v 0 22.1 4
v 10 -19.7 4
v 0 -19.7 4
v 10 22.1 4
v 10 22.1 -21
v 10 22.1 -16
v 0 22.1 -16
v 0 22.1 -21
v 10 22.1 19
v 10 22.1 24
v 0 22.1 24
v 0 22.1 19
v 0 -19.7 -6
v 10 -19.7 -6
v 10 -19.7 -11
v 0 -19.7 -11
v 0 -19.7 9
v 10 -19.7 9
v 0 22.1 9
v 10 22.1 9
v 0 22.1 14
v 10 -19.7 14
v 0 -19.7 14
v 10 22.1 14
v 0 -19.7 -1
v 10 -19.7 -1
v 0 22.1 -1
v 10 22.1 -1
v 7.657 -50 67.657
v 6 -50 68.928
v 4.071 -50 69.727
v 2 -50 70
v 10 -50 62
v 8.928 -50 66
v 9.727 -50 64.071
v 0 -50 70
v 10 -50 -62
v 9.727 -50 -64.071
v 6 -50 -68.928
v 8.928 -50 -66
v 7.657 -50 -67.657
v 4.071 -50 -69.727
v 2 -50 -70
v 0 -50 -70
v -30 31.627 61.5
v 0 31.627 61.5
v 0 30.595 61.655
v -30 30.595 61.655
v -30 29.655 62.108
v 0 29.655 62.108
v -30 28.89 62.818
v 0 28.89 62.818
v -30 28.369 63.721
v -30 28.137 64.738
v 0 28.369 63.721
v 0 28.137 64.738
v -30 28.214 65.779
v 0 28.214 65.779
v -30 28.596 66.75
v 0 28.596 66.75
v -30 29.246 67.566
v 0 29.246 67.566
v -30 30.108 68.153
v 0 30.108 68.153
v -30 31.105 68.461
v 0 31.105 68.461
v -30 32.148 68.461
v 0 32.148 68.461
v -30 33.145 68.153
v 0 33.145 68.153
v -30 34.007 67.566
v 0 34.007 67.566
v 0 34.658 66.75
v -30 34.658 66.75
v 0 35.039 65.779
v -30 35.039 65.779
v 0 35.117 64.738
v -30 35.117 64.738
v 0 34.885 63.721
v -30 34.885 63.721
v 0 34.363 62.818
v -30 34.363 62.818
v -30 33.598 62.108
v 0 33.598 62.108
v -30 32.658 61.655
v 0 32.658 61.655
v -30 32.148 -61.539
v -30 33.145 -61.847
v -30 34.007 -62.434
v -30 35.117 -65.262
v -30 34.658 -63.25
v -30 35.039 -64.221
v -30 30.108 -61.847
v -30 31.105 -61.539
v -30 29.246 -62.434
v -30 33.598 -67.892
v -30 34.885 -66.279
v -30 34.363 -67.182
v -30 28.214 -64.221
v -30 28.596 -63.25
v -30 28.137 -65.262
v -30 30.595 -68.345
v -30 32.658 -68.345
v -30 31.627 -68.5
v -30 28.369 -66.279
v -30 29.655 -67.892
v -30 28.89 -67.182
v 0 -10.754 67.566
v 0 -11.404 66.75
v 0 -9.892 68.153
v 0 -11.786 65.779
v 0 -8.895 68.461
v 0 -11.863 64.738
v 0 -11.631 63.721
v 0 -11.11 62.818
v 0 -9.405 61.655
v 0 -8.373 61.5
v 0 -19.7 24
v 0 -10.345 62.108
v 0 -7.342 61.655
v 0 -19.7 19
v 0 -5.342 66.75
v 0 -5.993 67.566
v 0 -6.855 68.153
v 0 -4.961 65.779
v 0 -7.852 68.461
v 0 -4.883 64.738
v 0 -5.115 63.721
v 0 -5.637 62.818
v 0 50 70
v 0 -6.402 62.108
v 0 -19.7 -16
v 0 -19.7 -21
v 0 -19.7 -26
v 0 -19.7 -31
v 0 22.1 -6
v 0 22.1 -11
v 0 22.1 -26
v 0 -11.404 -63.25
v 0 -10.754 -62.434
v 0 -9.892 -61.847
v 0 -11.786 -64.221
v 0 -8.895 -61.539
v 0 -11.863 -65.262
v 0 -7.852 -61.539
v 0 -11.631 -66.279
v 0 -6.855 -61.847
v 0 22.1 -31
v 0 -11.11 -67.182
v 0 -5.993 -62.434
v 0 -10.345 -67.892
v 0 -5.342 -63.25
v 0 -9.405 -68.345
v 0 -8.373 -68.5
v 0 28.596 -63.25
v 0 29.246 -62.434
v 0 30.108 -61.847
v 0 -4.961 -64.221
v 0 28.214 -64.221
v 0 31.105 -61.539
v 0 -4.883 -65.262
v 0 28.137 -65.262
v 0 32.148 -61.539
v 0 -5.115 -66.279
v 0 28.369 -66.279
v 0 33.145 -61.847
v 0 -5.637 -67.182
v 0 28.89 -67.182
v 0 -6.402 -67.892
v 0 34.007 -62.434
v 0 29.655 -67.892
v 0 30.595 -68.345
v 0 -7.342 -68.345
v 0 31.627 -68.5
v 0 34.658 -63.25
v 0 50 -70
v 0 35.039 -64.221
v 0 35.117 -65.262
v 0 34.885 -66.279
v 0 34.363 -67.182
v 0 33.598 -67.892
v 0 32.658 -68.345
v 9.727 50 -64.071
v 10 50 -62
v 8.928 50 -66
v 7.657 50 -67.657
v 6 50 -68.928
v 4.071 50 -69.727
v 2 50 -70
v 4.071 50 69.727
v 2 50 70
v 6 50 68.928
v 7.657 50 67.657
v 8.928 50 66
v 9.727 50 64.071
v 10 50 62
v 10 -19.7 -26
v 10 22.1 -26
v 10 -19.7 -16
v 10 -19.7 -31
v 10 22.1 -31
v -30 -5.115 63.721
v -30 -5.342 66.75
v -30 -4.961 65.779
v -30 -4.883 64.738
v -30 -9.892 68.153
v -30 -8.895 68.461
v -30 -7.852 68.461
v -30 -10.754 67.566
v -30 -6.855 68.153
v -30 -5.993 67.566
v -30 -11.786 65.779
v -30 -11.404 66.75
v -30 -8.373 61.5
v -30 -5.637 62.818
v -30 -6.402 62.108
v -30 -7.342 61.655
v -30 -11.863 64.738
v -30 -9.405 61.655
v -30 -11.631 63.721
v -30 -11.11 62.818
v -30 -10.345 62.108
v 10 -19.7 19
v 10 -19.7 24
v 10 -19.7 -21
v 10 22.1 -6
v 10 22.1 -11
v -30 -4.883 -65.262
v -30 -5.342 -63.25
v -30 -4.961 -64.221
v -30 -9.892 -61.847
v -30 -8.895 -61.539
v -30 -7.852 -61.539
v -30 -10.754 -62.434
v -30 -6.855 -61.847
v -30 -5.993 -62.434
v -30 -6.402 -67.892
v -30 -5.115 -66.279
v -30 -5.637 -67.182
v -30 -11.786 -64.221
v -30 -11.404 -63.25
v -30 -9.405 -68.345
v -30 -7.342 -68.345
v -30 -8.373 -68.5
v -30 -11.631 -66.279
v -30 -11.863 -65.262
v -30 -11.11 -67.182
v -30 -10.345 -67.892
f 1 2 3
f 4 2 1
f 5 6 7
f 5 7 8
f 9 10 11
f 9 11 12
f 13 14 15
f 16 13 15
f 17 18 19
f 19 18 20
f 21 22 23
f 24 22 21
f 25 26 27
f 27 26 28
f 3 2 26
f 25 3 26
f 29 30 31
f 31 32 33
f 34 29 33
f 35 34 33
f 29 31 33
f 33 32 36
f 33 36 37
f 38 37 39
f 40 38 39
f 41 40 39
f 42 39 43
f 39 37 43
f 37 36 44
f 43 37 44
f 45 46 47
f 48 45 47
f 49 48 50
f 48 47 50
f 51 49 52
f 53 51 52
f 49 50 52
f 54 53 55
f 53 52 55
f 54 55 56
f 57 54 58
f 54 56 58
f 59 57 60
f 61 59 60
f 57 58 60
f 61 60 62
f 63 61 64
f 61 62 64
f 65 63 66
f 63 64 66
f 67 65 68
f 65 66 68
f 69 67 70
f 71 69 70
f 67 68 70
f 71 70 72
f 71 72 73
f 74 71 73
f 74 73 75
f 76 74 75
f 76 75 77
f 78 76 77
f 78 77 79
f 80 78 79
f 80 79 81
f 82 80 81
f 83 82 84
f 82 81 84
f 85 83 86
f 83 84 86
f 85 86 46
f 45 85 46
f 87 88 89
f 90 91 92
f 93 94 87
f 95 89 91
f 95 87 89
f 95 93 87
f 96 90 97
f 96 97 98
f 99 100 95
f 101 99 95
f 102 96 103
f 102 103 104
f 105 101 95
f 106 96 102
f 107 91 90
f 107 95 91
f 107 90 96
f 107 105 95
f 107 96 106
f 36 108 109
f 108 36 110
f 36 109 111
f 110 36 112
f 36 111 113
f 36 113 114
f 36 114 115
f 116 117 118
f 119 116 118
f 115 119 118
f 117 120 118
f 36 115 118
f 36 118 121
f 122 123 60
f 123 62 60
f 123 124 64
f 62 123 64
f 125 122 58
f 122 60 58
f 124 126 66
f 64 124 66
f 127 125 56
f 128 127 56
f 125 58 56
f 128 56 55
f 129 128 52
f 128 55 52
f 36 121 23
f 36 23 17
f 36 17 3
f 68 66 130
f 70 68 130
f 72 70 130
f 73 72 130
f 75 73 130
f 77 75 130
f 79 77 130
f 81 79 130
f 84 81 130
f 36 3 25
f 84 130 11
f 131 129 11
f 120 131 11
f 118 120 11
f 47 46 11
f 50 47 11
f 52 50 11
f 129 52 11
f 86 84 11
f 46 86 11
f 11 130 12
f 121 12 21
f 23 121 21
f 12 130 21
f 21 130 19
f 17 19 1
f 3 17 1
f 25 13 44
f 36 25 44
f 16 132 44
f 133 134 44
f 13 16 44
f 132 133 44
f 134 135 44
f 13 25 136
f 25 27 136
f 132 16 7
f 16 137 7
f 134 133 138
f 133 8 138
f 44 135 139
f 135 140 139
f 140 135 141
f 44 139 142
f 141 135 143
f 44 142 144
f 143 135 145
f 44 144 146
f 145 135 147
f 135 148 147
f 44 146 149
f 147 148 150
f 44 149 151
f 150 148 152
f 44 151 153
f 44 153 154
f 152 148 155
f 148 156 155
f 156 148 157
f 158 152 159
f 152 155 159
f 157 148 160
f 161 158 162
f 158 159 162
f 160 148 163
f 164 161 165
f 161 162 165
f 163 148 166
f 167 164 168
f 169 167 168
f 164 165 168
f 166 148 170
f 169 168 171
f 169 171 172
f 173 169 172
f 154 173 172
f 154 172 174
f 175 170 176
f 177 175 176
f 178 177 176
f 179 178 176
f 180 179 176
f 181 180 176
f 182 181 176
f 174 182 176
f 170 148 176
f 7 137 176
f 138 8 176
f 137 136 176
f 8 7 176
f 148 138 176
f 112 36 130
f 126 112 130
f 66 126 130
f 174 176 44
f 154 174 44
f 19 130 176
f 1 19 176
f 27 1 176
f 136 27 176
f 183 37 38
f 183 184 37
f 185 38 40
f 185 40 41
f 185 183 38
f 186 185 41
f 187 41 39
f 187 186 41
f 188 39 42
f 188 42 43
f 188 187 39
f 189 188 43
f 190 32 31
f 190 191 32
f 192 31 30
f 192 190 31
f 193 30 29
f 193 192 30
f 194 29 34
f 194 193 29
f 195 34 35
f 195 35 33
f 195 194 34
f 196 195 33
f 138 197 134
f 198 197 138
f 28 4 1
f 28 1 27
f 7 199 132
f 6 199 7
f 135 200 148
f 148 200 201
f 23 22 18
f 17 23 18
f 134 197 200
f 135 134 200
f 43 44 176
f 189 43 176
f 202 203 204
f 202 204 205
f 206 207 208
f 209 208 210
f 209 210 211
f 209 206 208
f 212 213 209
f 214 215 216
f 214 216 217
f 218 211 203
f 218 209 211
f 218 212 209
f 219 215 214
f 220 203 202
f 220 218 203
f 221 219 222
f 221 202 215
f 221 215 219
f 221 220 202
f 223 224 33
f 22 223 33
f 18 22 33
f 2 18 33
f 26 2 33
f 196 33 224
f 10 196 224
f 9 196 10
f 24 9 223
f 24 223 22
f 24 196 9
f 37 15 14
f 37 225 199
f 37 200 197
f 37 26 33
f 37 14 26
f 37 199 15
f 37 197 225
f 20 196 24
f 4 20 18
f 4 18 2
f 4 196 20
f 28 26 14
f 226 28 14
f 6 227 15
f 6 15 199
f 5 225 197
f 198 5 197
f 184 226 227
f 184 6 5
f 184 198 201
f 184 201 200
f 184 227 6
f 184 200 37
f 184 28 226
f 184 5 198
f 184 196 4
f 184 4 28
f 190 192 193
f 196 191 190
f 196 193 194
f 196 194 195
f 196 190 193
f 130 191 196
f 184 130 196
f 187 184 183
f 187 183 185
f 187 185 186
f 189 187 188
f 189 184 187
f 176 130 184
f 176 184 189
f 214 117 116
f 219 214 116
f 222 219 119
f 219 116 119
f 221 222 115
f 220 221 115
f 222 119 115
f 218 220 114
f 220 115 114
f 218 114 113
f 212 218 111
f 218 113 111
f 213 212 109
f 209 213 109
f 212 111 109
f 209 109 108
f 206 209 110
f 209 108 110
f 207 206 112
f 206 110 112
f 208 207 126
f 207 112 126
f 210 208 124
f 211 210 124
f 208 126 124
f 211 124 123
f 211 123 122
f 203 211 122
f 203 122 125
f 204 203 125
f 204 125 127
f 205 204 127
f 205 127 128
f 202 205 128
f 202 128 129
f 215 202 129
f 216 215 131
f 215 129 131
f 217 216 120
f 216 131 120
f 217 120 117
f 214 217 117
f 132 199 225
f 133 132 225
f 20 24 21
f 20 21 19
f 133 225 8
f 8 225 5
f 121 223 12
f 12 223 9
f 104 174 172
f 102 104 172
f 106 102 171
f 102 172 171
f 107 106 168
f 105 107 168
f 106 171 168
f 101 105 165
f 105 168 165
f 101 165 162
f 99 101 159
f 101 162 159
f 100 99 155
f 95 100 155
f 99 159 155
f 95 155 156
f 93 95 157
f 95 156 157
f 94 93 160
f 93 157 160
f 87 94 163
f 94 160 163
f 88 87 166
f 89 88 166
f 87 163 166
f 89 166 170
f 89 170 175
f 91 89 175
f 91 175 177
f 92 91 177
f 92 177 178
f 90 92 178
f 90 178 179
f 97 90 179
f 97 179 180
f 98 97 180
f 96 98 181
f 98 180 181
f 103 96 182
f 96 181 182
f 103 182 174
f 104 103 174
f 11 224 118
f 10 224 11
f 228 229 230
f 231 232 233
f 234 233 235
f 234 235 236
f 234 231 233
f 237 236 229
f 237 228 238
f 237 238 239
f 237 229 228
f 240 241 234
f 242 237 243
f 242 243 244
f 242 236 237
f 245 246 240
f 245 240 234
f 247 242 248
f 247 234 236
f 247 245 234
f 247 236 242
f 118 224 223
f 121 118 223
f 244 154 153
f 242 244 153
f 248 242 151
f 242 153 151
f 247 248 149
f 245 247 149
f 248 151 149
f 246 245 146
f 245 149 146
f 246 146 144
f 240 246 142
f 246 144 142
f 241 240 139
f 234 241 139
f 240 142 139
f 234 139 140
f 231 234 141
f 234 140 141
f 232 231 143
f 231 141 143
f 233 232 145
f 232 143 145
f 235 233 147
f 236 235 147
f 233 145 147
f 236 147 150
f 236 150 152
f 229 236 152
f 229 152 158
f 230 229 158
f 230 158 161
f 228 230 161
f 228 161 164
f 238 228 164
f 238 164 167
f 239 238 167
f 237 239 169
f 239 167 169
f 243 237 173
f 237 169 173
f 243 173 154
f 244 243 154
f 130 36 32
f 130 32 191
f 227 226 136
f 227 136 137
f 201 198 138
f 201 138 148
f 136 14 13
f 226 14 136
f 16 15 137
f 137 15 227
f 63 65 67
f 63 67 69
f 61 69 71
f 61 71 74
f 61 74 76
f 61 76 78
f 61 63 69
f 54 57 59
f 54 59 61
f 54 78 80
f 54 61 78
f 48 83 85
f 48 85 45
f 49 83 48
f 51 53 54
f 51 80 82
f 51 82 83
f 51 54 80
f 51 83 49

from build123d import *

# Parameters (mm, degrees)
SKETCH2_W           = 140
SKETCH2_H           = 100
BOSS_EXTRUDE1_DEPTH = 10
SKETCH3_R           = 3.5
BOSS_EXTRUDE2_DEPTH = 30
FILLET1_R           = 8
SKETCH4_W           = 5
SKETCH4_H           = 41.8
CUT_EXTRUDE1_DEPTH  = 30


with BuildPart() as part:
    # Sketch2 → Boss-Extrude1 (new body)
    with BuildSketch(Plane(origin=(0, 0, 0), x_dir=(0, 0, -1), z_dir=(1, 0, 0))):
        Rectangle(SKETCH2_W, SKETCH2_H)
    extrude(amount=BOSS_EXTRUDE1_DEPTH)

    # Sketch3 → Boss-Extrude2 (add)
    with BuildSketch(Plane.ZY):
        with Locations(Location((-65, 31.6267322, 0), (0, 0, 180))):
            Circle(SKETCH3_R)
        with Locations(Location((-65, -8.3732678, 0), (0, 0, 180))):
            Circle(SKETCH3_R)
        with Locations(Location((65, 31.6267322, 0), (0, 0, 180))):
            Circle(SKETCH3_R)
        with Locations(Location((65, -8.3732678, 0), (0, 0, 180))):
            Circle(SKETCH3_R)
    extrude(amount=BOSS_EXTRUDE2_DEPTH)

    # Fillet1
    fillet1_edges = [part.edges().sort_by_distance(p)[0] for p in [
        (10, 0, -70),
        (10, 0, 70),
    ]]
    fillet(fillet1_edges, radius=FILLET1_R)

    # Sketch4 → Cut-Extrude1 (cut)
    with BuildSketch(Plane(origin=(10, 0, 0), x_dir=(0, 0, -1), z_dir=(1, 0, 0))):
        with Locations((18.5, 1.2)):
            Rectangle(SKETCH4_W, SKETCH4_H)
        with Locations((28.5, 1.2)):
            Rectangle(SKETCH4_W, SKETCH4_H)
        with Locations((-1.5, 1.2)):
            Rectangle(SKETCH4_W, SKETCH4_H)
        with Locations((8.5, 1.2)):
            Rectangle(SKETCH4_W, SKETCH4_H)
        with Locations((-21.5, 1.2)):
            Rectangle(SKETCH4_W, SKETCH4_H)
        with Locations((-11.5, 1.2)):
            Rectangle(SKETCH4_W, SKETCH4_H)
    extrude(amount=-CUT_EXTRUDE1_DEPTH, mode=Mode.SUBTRACT)


solid = part.part
